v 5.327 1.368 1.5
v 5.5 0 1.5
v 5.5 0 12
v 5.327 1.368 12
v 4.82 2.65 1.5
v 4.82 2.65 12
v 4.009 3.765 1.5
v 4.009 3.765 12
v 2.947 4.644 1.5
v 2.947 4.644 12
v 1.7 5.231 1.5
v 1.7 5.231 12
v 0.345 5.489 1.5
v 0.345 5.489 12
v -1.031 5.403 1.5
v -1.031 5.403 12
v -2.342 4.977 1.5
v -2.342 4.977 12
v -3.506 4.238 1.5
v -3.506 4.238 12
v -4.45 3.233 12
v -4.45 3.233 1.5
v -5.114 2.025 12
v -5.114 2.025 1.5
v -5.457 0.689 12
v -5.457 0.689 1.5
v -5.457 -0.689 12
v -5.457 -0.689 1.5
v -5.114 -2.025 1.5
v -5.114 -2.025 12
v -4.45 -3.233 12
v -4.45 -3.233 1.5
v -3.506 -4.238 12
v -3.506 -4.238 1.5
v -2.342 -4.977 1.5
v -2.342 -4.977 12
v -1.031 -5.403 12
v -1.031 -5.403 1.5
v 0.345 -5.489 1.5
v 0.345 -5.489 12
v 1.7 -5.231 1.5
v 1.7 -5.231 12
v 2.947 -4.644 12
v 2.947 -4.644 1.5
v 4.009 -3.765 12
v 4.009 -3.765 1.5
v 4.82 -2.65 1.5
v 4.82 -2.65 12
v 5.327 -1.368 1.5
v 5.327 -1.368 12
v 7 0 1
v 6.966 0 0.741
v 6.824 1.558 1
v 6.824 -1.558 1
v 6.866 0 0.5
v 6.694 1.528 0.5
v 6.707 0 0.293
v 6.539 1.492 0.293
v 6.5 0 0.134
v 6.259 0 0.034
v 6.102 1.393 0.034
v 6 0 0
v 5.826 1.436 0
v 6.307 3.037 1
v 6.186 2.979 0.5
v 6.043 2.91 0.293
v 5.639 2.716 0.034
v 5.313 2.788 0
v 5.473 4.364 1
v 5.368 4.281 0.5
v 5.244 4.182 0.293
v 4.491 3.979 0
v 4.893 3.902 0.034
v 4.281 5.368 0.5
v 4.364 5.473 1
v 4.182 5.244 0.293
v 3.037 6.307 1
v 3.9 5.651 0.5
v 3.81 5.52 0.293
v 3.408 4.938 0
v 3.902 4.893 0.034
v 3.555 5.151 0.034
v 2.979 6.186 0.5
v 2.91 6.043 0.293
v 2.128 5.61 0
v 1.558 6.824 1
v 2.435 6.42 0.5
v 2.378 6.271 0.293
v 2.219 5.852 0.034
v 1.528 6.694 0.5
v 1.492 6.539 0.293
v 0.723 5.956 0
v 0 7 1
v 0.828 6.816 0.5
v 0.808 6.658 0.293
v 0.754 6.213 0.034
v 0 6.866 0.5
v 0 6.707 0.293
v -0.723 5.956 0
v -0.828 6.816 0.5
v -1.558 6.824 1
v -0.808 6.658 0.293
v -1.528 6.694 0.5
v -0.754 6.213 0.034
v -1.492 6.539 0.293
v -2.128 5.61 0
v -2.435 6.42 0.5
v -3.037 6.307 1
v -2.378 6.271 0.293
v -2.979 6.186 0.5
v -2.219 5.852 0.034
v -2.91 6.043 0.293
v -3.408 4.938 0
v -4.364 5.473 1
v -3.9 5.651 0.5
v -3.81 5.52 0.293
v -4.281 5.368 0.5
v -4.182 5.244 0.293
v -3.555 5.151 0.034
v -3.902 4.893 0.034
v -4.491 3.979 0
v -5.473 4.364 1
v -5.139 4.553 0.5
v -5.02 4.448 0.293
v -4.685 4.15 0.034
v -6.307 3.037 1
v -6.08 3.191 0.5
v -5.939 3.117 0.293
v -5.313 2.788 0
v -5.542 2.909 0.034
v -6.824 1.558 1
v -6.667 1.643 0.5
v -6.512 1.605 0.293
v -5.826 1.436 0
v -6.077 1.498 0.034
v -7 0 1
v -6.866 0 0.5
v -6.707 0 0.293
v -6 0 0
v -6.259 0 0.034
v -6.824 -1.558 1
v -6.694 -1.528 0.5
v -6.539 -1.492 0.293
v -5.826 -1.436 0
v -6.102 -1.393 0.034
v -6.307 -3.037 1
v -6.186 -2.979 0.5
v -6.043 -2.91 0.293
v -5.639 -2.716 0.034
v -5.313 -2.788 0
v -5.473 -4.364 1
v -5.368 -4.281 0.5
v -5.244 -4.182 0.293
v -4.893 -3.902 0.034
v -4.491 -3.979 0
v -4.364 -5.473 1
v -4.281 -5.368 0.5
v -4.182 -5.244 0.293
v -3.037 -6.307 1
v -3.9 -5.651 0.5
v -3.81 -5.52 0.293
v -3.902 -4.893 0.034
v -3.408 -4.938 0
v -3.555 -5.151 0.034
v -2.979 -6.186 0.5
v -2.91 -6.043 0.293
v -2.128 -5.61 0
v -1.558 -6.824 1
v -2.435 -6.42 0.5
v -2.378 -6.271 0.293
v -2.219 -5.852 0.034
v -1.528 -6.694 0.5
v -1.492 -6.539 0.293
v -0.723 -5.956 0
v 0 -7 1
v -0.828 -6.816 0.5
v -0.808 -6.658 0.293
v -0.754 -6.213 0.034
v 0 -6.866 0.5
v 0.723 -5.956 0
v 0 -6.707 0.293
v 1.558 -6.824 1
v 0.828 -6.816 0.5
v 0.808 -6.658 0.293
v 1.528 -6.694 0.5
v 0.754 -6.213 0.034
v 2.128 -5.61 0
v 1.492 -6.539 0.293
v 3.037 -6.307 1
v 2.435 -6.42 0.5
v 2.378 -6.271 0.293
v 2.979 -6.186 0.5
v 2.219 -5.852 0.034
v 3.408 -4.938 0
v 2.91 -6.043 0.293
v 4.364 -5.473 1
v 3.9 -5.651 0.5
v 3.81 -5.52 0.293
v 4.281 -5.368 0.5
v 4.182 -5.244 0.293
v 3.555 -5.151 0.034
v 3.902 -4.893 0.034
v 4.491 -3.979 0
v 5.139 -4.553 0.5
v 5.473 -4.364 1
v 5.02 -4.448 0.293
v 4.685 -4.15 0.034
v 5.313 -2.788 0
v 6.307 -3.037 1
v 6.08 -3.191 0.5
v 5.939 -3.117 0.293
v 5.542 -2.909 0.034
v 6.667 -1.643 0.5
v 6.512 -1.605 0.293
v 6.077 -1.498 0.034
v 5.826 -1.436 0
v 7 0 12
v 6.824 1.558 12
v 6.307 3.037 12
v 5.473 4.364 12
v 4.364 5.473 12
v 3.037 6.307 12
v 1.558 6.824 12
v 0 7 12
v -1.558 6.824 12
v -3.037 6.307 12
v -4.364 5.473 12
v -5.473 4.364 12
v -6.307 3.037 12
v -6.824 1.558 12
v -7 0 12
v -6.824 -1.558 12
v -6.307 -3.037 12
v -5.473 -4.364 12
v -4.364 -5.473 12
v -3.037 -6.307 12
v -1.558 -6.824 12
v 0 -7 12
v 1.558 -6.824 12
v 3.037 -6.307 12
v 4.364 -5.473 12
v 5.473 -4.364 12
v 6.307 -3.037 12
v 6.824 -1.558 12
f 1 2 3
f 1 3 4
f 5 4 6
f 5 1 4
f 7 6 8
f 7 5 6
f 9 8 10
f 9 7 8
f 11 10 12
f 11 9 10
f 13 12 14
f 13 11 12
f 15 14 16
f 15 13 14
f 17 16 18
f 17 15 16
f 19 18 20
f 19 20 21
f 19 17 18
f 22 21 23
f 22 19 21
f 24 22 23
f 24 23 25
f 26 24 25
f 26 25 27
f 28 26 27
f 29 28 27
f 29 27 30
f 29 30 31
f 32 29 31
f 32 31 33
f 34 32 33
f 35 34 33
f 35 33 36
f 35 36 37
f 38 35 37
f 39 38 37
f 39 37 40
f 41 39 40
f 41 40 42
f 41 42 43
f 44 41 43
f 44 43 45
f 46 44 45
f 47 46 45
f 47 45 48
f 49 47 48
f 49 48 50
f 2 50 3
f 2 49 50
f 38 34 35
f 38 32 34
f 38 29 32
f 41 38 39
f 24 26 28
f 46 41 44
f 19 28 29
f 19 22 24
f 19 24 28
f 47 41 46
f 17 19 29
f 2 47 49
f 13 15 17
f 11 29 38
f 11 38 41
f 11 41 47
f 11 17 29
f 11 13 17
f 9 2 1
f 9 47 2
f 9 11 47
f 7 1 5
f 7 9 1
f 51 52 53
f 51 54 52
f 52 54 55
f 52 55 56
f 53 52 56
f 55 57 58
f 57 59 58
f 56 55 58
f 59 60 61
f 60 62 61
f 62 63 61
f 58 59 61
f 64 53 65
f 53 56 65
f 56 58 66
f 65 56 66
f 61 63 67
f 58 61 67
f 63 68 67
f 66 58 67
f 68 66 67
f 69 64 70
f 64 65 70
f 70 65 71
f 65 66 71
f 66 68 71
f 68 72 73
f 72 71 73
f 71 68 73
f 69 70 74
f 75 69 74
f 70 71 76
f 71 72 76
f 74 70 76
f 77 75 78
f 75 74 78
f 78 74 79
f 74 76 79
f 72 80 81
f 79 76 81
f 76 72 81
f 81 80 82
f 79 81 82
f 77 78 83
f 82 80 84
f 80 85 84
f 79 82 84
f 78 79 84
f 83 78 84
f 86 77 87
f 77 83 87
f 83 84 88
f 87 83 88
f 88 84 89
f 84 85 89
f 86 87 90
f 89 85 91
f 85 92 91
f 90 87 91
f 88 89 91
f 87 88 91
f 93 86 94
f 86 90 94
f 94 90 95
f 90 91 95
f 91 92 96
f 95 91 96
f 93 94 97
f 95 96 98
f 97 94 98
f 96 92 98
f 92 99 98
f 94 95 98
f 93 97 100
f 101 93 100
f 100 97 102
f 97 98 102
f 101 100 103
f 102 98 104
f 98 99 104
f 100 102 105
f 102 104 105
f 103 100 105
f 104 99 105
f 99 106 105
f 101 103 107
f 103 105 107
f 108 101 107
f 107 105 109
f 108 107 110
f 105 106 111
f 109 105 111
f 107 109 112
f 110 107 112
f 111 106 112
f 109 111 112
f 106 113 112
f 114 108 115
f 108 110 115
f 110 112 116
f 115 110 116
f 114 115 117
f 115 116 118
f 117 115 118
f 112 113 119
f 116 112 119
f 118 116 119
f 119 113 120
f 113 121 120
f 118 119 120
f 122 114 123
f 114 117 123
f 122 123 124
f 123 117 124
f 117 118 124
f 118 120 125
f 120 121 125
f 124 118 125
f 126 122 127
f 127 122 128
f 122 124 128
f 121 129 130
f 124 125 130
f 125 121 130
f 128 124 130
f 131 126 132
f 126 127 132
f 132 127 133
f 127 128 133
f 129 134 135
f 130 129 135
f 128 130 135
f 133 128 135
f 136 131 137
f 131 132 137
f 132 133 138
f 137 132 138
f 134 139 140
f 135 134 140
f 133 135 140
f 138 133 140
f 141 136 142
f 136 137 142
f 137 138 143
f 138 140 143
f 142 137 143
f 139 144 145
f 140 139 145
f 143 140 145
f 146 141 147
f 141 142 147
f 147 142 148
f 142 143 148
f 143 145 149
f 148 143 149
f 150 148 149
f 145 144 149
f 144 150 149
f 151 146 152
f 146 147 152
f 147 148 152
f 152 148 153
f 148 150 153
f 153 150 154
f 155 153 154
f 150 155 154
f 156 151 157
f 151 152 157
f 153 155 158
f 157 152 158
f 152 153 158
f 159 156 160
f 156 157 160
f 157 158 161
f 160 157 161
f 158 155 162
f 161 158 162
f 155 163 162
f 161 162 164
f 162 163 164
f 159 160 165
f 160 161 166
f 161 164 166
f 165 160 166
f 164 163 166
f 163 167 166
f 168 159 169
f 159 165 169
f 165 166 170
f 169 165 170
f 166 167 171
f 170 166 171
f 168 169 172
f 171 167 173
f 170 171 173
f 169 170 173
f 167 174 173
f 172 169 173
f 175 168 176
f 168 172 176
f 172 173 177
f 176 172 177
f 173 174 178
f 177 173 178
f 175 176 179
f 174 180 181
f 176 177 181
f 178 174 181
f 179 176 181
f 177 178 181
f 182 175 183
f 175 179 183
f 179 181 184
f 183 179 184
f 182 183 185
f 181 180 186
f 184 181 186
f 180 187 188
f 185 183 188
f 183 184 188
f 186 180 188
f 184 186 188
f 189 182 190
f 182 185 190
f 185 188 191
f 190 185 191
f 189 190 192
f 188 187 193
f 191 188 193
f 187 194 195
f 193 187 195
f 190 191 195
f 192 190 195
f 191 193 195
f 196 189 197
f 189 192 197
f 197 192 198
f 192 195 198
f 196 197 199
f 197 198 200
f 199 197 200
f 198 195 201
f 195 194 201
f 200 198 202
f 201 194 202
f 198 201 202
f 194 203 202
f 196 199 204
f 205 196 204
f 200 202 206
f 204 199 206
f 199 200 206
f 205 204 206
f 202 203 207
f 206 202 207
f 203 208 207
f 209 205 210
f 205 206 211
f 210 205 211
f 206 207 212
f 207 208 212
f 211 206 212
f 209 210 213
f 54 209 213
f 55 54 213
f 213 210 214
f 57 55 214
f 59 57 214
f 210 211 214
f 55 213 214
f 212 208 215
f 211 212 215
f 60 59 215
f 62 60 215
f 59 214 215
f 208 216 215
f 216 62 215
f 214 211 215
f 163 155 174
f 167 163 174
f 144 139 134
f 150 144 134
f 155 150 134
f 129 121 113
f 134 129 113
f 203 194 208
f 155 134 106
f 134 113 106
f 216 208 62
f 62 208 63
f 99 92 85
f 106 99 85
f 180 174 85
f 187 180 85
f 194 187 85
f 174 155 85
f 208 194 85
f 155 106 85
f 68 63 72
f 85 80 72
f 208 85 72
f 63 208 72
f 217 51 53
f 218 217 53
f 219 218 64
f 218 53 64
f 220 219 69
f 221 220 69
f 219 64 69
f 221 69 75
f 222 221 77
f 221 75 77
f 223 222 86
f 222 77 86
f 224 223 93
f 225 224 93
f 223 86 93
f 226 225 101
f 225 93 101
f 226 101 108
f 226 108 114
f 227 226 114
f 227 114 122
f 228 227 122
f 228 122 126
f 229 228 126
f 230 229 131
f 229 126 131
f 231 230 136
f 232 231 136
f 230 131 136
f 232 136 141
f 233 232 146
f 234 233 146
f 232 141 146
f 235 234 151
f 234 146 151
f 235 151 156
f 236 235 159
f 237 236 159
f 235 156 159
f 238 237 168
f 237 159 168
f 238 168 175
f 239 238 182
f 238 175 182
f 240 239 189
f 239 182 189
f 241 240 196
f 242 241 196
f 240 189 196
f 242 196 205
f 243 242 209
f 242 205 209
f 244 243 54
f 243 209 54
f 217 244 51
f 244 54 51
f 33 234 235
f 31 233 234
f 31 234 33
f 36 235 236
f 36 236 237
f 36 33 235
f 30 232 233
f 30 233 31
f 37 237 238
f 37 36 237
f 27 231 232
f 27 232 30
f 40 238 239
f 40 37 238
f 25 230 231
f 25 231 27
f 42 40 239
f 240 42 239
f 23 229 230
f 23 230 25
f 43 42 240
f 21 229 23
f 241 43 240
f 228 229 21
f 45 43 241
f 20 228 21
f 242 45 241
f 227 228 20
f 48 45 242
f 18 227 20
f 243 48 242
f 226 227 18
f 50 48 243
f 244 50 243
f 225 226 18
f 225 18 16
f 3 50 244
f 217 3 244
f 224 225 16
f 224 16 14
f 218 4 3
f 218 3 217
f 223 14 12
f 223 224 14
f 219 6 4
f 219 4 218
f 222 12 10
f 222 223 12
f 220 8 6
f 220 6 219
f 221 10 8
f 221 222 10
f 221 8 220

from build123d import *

# Parameters (mm, degrees)
F0_R     = 7
F1_DEPTH = 12
F2_T     = -1.5
F3_R     = 1


with BuildPart() as f1:
    # F0 (on Top) → F1 (new body)
    with BuildSketch(Plane.XY):
        Circle(F0_R)
    extrude(amount=F1_DEPTH)

    # F2
    f2_openings = [f1.faces().sort_by_distance(p)[0] for p in [
        (0, 0, 12),
    ]]
    offset(amount=F2_T, openings=f2_openings)

    # F3
    f3_edges = [f1.edges().sort_by_distance(p)[0] for p in [
        (-7, 0, 0),
    ]]
    fillet(f3_edges, radius=F3_R)


solid = f1.part
